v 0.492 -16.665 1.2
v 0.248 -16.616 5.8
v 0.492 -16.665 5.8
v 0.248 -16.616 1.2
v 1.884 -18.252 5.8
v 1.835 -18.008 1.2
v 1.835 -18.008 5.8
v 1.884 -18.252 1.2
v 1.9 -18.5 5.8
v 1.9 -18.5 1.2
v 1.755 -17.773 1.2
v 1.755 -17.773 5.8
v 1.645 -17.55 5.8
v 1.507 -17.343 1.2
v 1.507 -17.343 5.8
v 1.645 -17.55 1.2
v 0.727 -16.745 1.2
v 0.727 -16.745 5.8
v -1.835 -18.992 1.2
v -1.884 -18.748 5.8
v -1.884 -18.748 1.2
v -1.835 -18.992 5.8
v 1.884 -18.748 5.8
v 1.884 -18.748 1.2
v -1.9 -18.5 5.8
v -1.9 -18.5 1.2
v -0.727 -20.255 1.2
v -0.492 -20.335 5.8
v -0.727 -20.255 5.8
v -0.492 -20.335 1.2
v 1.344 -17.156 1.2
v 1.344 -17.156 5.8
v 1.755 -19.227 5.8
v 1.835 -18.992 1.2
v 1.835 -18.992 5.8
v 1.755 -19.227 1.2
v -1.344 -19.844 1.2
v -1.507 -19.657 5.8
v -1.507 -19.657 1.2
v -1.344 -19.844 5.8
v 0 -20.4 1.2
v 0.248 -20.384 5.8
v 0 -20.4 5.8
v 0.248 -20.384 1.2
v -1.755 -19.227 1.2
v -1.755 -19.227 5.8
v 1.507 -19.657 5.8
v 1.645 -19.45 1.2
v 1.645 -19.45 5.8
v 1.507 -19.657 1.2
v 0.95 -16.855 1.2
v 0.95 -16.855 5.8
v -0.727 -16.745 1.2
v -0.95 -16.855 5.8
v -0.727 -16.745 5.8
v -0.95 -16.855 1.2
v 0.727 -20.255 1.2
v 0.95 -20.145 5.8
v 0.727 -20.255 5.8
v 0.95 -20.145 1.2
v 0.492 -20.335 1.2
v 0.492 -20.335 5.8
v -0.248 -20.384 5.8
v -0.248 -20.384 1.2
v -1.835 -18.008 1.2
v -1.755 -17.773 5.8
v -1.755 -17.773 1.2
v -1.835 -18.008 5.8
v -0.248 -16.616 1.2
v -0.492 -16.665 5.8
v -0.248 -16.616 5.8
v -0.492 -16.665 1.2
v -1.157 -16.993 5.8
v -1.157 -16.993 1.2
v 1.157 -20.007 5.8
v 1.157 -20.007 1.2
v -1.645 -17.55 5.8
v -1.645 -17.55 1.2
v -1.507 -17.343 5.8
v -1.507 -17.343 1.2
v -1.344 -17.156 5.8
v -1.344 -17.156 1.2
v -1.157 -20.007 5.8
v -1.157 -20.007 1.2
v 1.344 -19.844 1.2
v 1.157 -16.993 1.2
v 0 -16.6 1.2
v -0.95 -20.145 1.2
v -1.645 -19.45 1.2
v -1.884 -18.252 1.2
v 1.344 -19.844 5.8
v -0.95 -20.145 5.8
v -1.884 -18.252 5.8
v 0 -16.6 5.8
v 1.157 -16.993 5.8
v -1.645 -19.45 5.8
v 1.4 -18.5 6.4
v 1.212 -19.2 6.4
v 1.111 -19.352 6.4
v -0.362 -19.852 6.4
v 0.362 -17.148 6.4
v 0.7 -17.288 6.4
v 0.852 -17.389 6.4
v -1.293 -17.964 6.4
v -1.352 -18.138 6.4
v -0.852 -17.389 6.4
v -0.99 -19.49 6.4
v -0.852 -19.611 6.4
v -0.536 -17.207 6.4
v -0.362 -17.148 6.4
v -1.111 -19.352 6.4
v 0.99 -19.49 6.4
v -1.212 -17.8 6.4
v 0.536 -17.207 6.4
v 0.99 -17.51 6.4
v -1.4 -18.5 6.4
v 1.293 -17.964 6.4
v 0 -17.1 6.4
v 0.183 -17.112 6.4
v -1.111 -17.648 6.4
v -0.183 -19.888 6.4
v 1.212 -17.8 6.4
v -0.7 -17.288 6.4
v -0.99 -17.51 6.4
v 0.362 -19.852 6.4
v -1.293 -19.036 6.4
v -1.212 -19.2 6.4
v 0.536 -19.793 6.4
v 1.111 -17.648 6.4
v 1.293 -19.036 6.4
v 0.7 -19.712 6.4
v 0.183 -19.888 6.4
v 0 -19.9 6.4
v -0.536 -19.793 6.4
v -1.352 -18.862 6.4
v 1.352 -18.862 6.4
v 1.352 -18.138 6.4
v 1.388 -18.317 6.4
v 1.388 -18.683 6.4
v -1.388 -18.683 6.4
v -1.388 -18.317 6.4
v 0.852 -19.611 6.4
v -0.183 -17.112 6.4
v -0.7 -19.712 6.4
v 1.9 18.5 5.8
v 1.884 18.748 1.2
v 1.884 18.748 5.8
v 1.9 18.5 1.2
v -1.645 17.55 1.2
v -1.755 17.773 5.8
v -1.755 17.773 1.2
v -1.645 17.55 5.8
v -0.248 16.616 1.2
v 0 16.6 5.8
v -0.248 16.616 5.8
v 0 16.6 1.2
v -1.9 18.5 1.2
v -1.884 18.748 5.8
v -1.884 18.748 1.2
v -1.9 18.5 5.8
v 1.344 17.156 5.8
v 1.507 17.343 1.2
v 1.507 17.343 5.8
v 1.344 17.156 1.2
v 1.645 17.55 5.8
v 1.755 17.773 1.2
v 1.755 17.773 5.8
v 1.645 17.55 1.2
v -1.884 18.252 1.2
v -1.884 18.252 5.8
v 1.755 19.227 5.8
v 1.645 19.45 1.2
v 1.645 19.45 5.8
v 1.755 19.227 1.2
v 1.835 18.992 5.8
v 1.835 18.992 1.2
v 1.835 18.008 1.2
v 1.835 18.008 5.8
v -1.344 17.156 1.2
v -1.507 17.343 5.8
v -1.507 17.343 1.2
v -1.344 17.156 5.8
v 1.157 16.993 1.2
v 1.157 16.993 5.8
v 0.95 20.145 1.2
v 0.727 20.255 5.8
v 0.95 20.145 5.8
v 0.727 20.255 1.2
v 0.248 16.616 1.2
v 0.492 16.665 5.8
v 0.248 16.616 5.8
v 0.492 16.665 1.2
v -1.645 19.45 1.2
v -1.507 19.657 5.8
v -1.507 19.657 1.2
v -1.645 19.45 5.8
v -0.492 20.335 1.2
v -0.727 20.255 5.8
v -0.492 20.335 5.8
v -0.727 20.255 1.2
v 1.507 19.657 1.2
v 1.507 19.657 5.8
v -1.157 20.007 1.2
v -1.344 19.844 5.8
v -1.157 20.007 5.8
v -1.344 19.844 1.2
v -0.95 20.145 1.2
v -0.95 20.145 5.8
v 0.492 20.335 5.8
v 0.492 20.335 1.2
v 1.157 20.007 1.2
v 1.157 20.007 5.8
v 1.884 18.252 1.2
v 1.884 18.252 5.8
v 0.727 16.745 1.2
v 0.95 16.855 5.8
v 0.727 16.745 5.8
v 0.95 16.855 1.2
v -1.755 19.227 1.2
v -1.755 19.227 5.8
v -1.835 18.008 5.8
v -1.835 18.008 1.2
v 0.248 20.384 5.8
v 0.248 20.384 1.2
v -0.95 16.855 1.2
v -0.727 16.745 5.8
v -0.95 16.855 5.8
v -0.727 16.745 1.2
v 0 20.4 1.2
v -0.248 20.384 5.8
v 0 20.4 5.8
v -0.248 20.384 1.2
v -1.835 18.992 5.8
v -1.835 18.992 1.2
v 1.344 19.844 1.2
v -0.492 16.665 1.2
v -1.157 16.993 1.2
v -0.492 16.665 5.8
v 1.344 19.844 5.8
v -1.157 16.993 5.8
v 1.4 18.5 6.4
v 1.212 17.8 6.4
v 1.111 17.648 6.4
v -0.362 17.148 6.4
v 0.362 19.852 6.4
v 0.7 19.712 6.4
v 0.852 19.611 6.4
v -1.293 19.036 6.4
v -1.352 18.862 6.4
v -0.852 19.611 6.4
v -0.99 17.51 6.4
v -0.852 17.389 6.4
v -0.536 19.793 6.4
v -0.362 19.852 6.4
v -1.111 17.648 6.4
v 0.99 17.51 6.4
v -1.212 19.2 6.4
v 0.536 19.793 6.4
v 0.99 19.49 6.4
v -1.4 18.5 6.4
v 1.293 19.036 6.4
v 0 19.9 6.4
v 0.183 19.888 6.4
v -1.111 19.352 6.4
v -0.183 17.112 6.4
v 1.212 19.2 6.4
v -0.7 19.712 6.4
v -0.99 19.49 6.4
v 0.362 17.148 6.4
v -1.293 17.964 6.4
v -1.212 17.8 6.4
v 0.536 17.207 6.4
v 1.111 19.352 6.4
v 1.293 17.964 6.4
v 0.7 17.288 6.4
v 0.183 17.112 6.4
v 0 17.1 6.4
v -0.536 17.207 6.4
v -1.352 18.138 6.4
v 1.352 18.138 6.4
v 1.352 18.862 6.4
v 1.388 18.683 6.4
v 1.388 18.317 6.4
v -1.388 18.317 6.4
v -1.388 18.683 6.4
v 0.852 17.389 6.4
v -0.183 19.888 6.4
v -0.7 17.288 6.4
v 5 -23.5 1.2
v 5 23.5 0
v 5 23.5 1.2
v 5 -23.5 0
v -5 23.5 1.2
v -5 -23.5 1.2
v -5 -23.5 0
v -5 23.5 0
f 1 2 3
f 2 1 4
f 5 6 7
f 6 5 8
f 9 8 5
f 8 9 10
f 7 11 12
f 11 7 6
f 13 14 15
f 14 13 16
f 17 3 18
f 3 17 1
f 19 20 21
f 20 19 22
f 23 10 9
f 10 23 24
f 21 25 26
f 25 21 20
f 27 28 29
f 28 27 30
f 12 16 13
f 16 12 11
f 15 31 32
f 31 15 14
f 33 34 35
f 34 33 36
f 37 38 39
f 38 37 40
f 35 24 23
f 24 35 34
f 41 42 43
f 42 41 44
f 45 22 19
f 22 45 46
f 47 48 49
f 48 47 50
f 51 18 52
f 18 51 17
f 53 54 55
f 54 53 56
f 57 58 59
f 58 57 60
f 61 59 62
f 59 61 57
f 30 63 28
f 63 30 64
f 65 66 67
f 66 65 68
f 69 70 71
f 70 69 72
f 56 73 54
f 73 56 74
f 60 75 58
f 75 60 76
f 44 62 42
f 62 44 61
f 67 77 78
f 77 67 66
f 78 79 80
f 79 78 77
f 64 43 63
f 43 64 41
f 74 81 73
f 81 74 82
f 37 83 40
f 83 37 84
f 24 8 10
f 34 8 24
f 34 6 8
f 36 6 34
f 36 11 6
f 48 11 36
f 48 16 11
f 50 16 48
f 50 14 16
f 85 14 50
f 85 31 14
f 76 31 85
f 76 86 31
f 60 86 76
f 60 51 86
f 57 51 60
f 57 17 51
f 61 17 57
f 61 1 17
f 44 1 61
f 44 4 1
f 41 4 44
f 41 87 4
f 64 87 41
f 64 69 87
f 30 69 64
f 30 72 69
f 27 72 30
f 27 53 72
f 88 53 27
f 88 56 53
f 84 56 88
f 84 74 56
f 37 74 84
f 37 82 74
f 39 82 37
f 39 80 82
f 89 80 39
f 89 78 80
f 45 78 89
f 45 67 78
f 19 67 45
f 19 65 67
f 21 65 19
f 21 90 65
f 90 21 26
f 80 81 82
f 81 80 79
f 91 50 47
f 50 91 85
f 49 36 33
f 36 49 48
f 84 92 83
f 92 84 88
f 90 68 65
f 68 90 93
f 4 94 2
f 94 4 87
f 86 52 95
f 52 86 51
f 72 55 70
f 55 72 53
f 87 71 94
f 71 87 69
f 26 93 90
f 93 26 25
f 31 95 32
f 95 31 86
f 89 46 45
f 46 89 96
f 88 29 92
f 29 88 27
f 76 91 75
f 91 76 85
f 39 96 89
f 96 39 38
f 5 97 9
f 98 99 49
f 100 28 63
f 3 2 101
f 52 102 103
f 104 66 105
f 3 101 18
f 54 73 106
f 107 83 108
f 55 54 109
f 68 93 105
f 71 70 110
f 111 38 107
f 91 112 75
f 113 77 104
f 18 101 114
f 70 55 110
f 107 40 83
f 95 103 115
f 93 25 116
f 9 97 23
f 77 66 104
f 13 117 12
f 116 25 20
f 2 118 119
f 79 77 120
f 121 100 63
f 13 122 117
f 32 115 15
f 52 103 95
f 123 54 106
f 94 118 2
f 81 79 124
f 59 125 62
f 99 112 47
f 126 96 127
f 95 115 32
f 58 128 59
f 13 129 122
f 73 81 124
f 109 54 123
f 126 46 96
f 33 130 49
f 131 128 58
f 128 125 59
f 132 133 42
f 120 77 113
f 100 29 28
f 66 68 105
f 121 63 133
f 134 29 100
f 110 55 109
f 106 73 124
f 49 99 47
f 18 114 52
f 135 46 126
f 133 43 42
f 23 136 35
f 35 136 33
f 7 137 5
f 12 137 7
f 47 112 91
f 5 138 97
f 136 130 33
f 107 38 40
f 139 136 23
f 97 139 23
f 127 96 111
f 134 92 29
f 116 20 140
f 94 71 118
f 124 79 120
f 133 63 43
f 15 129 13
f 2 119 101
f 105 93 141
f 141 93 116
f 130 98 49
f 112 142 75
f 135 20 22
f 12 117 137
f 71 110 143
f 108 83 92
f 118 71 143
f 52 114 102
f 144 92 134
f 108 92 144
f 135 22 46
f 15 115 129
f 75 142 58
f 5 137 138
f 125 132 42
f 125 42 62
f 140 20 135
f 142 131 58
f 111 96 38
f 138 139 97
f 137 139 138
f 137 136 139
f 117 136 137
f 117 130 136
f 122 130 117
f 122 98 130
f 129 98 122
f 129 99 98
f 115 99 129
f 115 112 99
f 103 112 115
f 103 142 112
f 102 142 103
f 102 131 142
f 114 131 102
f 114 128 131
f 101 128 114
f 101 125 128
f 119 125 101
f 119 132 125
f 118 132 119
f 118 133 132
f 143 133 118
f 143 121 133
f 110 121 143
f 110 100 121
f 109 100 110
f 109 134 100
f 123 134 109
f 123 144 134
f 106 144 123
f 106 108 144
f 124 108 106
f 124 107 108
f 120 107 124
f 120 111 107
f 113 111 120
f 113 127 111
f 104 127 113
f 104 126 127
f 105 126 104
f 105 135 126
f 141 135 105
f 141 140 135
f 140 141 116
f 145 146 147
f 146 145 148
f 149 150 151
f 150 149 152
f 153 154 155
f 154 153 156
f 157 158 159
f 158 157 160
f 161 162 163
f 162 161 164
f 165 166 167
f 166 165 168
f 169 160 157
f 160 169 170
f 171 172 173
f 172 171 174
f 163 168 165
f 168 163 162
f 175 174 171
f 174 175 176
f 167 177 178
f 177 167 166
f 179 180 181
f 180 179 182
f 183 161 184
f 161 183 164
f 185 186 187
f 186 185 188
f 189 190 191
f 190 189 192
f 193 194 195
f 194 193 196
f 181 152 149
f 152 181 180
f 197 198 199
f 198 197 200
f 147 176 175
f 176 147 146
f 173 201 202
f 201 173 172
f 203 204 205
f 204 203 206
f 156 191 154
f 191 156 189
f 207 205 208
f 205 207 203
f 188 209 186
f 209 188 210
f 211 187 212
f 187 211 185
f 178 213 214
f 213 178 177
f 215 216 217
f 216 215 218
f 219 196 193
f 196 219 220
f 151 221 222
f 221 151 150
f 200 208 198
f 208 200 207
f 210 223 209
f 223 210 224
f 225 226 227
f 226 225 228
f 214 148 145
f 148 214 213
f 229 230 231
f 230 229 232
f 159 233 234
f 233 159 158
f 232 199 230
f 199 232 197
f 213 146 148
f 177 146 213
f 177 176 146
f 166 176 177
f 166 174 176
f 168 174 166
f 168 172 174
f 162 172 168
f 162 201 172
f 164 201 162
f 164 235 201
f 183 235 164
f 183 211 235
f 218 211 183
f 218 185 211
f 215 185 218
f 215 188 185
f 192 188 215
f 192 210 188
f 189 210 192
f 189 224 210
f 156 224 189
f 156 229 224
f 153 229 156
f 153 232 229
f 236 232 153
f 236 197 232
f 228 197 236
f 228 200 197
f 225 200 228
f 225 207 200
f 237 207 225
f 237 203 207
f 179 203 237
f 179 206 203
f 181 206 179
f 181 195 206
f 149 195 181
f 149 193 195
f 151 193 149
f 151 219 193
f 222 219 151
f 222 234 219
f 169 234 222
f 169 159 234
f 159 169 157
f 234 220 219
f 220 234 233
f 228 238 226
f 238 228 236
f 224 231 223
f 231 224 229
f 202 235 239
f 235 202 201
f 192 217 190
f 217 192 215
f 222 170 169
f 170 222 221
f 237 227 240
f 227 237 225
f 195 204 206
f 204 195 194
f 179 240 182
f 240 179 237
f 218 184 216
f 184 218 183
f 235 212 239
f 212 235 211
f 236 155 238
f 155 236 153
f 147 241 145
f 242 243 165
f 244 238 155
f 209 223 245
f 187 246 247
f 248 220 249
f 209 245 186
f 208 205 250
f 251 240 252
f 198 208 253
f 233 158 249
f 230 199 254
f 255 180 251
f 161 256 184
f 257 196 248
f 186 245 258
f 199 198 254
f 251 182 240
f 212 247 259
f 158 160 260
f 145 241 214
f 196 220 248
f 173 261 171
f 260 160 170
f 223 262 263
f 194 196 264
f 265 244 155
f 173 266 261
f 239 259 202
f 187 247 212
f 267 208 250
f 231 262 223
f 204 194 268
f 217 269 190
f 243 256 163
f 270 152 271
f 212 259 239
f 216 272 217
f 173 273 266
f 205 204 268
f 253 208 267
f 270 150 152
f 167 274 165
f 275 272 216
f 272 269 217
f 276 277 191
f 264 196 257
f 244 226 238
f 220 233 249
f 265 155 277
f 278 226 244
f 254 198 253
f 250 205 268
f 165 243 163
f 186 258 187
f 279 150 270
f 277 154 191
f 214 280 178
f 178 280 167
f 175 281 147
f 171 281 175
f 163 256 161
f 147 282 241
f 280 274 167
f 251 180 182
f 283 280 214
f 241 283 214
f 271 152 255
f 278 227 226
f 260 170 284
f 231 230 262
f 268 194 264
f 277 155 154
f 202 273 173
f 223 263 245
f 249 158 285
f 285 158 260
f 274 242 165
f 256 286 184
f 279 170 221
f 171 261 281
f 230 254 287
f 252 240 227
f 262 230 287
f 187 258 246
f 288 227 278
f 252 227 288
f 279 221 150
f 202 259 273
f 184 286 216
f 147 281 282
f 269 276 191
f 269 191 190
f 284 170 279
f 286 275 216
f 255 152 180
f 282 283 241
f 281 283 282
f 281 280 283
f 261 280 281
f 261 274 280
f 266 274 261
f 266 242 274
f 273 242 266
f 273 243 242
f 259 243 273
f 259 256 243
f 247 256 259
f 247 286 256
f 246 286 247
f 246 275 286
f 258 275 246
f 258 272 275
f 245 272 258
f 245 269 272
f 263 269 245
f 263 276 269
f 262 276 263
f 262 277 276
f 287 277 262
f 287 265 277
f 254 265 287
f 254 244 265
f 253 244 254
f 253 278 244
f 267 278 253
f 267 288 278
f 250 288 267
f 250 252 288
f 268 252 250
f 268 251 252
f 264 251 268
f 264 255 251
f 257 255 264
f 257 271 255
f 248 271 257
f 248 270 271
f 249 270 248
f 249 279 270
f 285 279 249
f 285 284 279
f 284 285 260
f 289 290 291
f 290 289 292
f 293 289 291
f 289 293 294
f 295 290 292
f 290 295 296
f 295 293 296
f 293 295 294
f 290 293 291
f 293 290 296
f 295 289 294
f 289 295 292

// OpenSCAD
// file: ../lib/label.scad
// SPDX-License-Identifier: MIT
// Copyright (c) 2026 Aaron Cupp
//
// label.scad — two-colour flat-inset text labels, shared across the bench system.
//
// Generalizes the technique proven in donation-qr-stand/: the text is a recessed
// pocket in the light part, filled flush by a matching inlay printed in the dark
// colour. On a multi-toolhead printer (Snapmaker U1) load both parts at the same
// origin and assign a colour to each. Flush beats raised relief — nothing to
// catch, nothing to peel, and it survives an IPA wipe, which a printed sticker
// does not.
//
// Both modules emit the label occupying z ∈ [-LABEL_T, 0], so the caller
// translates to the face being labelled and the inlay tops out flush:
//
//     difference() { my_bin(); translate([0, 30, top_z]) label_pocket("0.45"); }
//     translate([0, 30, top_z]) label_inlay("0.45");            // dark part
//
// Single-colour fallback: label_pocket() alone gives an engraved label that
// still reads, just without the contrast.

LABEL_T    = 0.8;                            // pocket depth = inlay thickness
LABEL_FONT = "Liberation Sans:style=Bold";   // renders locally and in CI
_L_EPS     = 0.02;                           // pocket overrun so difference() is clean

// 2D text outline, centred on the origin by default.
module label_2d(txt, size = 6, font = LABEL_FONT, halign = "center", valign = "center") {
    text(txt, size = size, font = font, halign = halign, valign = valign);
}

// Solid to SUBTRACT from the light part. Overruns the face so the cut is clean.
module label_pocket(txt, size = 6, depth = LABEL_T, font = LABEL_FONT,
                    halign = "center", valign = "center") {
    translate([0, 0, -depth])
        linear_extrude(depth + _L_EPS) label_2d(txt, size, font, halign, valign);
}

// Solid to ADD to the dark part. Fills the pocket flush — no overrun.
module label_inlay(txt, size = 6, depth = LABEL_T, font = LABEL_FONT,
                   halign = "center", valign = "center") {
    translate([0, 0, -depth])
        linear_extrude(depth) label_2d(txt, size, font, halign, valign);
}

// Same pair for a text label on a VERTICAL face (bin front, divider tab), where
// the labelled surface faces +Y. Label occupies y ∈ [-LABEL_T, 0].
module label_pocket_v(txt, size = 6, depth = LABEL_T, font = LABEL_FONT) {
    rotate([90, 0, 0]) translate([0, 0, -_L_EPS])
        linear_extrude(depth + _L_EPS) label_2d(txt, size, font);
}

module label_inlay_v(txt, size = 6, depth = LABEL_T, font = LABEL_FONT) {
    rotate([90, 0, 0]) linear_extrude(depth) label_2d(txt, size, font);
}
// main file
// rig_dock_rail.scad — one of two rails that hold the x16 riser on the deck.
//
// The board (PCE164P-N03 VER 006C) has the x16 slot flush along one long edge,
// capacitors crowding the other, and the 6-pin + USB filling a short end, so
// there's no clean edge to clip. It does have four mounting holes on a 99 x 37
// pitch, so: two pegs per rail, one rail under each end of the board. The
// board lies on its own factory foam pad; the pegs reach through 4 mm of foam
// + PCB and stand 1.2 proud.
//
// The rail sits flush in a pocket on the deck and is CA-glued. It's a
// separate part because the cup prints deck-down and a peg can't grow off the
// face that's on the bed.
//
// PEG_D is the fit that matters — print coupons/dock_rail_ladder.scad first.

include <rig_common.scad>

module rig_dock_rail(peg_d = PEG_D) {
    peg_h = PEG_H_ABOVE_DECK - (RAIL_T - RAIL_POCKET);   // above the rail's top
    union() {
        translate([-RAIL_W/2, -RAIL_L/2, 0]) cube([RAIL_W, RAIL_L, RAIL_T]);
        for (sy = [-1, 1])
            translate([0, sy*RISER_HOLE_PITCH_W/2, RAIL_T]) {
                cylinder(d = peg_d, h = peg_h - 0.6);
                translate([0, 0, peg_h - 0.6]) cylinder(d1 = peg_d, d2 = peg_d - 1.0, h = 0.6);  // lead-in
            }
    }
}

rig_dock_rail();
echo(str("rig_dock_rail: ", RAIL_W, " x ", RAIL_L, ", pegs ", PEG_D, " at ", RISER_HOLE_PITCH_W, " pitch"));
